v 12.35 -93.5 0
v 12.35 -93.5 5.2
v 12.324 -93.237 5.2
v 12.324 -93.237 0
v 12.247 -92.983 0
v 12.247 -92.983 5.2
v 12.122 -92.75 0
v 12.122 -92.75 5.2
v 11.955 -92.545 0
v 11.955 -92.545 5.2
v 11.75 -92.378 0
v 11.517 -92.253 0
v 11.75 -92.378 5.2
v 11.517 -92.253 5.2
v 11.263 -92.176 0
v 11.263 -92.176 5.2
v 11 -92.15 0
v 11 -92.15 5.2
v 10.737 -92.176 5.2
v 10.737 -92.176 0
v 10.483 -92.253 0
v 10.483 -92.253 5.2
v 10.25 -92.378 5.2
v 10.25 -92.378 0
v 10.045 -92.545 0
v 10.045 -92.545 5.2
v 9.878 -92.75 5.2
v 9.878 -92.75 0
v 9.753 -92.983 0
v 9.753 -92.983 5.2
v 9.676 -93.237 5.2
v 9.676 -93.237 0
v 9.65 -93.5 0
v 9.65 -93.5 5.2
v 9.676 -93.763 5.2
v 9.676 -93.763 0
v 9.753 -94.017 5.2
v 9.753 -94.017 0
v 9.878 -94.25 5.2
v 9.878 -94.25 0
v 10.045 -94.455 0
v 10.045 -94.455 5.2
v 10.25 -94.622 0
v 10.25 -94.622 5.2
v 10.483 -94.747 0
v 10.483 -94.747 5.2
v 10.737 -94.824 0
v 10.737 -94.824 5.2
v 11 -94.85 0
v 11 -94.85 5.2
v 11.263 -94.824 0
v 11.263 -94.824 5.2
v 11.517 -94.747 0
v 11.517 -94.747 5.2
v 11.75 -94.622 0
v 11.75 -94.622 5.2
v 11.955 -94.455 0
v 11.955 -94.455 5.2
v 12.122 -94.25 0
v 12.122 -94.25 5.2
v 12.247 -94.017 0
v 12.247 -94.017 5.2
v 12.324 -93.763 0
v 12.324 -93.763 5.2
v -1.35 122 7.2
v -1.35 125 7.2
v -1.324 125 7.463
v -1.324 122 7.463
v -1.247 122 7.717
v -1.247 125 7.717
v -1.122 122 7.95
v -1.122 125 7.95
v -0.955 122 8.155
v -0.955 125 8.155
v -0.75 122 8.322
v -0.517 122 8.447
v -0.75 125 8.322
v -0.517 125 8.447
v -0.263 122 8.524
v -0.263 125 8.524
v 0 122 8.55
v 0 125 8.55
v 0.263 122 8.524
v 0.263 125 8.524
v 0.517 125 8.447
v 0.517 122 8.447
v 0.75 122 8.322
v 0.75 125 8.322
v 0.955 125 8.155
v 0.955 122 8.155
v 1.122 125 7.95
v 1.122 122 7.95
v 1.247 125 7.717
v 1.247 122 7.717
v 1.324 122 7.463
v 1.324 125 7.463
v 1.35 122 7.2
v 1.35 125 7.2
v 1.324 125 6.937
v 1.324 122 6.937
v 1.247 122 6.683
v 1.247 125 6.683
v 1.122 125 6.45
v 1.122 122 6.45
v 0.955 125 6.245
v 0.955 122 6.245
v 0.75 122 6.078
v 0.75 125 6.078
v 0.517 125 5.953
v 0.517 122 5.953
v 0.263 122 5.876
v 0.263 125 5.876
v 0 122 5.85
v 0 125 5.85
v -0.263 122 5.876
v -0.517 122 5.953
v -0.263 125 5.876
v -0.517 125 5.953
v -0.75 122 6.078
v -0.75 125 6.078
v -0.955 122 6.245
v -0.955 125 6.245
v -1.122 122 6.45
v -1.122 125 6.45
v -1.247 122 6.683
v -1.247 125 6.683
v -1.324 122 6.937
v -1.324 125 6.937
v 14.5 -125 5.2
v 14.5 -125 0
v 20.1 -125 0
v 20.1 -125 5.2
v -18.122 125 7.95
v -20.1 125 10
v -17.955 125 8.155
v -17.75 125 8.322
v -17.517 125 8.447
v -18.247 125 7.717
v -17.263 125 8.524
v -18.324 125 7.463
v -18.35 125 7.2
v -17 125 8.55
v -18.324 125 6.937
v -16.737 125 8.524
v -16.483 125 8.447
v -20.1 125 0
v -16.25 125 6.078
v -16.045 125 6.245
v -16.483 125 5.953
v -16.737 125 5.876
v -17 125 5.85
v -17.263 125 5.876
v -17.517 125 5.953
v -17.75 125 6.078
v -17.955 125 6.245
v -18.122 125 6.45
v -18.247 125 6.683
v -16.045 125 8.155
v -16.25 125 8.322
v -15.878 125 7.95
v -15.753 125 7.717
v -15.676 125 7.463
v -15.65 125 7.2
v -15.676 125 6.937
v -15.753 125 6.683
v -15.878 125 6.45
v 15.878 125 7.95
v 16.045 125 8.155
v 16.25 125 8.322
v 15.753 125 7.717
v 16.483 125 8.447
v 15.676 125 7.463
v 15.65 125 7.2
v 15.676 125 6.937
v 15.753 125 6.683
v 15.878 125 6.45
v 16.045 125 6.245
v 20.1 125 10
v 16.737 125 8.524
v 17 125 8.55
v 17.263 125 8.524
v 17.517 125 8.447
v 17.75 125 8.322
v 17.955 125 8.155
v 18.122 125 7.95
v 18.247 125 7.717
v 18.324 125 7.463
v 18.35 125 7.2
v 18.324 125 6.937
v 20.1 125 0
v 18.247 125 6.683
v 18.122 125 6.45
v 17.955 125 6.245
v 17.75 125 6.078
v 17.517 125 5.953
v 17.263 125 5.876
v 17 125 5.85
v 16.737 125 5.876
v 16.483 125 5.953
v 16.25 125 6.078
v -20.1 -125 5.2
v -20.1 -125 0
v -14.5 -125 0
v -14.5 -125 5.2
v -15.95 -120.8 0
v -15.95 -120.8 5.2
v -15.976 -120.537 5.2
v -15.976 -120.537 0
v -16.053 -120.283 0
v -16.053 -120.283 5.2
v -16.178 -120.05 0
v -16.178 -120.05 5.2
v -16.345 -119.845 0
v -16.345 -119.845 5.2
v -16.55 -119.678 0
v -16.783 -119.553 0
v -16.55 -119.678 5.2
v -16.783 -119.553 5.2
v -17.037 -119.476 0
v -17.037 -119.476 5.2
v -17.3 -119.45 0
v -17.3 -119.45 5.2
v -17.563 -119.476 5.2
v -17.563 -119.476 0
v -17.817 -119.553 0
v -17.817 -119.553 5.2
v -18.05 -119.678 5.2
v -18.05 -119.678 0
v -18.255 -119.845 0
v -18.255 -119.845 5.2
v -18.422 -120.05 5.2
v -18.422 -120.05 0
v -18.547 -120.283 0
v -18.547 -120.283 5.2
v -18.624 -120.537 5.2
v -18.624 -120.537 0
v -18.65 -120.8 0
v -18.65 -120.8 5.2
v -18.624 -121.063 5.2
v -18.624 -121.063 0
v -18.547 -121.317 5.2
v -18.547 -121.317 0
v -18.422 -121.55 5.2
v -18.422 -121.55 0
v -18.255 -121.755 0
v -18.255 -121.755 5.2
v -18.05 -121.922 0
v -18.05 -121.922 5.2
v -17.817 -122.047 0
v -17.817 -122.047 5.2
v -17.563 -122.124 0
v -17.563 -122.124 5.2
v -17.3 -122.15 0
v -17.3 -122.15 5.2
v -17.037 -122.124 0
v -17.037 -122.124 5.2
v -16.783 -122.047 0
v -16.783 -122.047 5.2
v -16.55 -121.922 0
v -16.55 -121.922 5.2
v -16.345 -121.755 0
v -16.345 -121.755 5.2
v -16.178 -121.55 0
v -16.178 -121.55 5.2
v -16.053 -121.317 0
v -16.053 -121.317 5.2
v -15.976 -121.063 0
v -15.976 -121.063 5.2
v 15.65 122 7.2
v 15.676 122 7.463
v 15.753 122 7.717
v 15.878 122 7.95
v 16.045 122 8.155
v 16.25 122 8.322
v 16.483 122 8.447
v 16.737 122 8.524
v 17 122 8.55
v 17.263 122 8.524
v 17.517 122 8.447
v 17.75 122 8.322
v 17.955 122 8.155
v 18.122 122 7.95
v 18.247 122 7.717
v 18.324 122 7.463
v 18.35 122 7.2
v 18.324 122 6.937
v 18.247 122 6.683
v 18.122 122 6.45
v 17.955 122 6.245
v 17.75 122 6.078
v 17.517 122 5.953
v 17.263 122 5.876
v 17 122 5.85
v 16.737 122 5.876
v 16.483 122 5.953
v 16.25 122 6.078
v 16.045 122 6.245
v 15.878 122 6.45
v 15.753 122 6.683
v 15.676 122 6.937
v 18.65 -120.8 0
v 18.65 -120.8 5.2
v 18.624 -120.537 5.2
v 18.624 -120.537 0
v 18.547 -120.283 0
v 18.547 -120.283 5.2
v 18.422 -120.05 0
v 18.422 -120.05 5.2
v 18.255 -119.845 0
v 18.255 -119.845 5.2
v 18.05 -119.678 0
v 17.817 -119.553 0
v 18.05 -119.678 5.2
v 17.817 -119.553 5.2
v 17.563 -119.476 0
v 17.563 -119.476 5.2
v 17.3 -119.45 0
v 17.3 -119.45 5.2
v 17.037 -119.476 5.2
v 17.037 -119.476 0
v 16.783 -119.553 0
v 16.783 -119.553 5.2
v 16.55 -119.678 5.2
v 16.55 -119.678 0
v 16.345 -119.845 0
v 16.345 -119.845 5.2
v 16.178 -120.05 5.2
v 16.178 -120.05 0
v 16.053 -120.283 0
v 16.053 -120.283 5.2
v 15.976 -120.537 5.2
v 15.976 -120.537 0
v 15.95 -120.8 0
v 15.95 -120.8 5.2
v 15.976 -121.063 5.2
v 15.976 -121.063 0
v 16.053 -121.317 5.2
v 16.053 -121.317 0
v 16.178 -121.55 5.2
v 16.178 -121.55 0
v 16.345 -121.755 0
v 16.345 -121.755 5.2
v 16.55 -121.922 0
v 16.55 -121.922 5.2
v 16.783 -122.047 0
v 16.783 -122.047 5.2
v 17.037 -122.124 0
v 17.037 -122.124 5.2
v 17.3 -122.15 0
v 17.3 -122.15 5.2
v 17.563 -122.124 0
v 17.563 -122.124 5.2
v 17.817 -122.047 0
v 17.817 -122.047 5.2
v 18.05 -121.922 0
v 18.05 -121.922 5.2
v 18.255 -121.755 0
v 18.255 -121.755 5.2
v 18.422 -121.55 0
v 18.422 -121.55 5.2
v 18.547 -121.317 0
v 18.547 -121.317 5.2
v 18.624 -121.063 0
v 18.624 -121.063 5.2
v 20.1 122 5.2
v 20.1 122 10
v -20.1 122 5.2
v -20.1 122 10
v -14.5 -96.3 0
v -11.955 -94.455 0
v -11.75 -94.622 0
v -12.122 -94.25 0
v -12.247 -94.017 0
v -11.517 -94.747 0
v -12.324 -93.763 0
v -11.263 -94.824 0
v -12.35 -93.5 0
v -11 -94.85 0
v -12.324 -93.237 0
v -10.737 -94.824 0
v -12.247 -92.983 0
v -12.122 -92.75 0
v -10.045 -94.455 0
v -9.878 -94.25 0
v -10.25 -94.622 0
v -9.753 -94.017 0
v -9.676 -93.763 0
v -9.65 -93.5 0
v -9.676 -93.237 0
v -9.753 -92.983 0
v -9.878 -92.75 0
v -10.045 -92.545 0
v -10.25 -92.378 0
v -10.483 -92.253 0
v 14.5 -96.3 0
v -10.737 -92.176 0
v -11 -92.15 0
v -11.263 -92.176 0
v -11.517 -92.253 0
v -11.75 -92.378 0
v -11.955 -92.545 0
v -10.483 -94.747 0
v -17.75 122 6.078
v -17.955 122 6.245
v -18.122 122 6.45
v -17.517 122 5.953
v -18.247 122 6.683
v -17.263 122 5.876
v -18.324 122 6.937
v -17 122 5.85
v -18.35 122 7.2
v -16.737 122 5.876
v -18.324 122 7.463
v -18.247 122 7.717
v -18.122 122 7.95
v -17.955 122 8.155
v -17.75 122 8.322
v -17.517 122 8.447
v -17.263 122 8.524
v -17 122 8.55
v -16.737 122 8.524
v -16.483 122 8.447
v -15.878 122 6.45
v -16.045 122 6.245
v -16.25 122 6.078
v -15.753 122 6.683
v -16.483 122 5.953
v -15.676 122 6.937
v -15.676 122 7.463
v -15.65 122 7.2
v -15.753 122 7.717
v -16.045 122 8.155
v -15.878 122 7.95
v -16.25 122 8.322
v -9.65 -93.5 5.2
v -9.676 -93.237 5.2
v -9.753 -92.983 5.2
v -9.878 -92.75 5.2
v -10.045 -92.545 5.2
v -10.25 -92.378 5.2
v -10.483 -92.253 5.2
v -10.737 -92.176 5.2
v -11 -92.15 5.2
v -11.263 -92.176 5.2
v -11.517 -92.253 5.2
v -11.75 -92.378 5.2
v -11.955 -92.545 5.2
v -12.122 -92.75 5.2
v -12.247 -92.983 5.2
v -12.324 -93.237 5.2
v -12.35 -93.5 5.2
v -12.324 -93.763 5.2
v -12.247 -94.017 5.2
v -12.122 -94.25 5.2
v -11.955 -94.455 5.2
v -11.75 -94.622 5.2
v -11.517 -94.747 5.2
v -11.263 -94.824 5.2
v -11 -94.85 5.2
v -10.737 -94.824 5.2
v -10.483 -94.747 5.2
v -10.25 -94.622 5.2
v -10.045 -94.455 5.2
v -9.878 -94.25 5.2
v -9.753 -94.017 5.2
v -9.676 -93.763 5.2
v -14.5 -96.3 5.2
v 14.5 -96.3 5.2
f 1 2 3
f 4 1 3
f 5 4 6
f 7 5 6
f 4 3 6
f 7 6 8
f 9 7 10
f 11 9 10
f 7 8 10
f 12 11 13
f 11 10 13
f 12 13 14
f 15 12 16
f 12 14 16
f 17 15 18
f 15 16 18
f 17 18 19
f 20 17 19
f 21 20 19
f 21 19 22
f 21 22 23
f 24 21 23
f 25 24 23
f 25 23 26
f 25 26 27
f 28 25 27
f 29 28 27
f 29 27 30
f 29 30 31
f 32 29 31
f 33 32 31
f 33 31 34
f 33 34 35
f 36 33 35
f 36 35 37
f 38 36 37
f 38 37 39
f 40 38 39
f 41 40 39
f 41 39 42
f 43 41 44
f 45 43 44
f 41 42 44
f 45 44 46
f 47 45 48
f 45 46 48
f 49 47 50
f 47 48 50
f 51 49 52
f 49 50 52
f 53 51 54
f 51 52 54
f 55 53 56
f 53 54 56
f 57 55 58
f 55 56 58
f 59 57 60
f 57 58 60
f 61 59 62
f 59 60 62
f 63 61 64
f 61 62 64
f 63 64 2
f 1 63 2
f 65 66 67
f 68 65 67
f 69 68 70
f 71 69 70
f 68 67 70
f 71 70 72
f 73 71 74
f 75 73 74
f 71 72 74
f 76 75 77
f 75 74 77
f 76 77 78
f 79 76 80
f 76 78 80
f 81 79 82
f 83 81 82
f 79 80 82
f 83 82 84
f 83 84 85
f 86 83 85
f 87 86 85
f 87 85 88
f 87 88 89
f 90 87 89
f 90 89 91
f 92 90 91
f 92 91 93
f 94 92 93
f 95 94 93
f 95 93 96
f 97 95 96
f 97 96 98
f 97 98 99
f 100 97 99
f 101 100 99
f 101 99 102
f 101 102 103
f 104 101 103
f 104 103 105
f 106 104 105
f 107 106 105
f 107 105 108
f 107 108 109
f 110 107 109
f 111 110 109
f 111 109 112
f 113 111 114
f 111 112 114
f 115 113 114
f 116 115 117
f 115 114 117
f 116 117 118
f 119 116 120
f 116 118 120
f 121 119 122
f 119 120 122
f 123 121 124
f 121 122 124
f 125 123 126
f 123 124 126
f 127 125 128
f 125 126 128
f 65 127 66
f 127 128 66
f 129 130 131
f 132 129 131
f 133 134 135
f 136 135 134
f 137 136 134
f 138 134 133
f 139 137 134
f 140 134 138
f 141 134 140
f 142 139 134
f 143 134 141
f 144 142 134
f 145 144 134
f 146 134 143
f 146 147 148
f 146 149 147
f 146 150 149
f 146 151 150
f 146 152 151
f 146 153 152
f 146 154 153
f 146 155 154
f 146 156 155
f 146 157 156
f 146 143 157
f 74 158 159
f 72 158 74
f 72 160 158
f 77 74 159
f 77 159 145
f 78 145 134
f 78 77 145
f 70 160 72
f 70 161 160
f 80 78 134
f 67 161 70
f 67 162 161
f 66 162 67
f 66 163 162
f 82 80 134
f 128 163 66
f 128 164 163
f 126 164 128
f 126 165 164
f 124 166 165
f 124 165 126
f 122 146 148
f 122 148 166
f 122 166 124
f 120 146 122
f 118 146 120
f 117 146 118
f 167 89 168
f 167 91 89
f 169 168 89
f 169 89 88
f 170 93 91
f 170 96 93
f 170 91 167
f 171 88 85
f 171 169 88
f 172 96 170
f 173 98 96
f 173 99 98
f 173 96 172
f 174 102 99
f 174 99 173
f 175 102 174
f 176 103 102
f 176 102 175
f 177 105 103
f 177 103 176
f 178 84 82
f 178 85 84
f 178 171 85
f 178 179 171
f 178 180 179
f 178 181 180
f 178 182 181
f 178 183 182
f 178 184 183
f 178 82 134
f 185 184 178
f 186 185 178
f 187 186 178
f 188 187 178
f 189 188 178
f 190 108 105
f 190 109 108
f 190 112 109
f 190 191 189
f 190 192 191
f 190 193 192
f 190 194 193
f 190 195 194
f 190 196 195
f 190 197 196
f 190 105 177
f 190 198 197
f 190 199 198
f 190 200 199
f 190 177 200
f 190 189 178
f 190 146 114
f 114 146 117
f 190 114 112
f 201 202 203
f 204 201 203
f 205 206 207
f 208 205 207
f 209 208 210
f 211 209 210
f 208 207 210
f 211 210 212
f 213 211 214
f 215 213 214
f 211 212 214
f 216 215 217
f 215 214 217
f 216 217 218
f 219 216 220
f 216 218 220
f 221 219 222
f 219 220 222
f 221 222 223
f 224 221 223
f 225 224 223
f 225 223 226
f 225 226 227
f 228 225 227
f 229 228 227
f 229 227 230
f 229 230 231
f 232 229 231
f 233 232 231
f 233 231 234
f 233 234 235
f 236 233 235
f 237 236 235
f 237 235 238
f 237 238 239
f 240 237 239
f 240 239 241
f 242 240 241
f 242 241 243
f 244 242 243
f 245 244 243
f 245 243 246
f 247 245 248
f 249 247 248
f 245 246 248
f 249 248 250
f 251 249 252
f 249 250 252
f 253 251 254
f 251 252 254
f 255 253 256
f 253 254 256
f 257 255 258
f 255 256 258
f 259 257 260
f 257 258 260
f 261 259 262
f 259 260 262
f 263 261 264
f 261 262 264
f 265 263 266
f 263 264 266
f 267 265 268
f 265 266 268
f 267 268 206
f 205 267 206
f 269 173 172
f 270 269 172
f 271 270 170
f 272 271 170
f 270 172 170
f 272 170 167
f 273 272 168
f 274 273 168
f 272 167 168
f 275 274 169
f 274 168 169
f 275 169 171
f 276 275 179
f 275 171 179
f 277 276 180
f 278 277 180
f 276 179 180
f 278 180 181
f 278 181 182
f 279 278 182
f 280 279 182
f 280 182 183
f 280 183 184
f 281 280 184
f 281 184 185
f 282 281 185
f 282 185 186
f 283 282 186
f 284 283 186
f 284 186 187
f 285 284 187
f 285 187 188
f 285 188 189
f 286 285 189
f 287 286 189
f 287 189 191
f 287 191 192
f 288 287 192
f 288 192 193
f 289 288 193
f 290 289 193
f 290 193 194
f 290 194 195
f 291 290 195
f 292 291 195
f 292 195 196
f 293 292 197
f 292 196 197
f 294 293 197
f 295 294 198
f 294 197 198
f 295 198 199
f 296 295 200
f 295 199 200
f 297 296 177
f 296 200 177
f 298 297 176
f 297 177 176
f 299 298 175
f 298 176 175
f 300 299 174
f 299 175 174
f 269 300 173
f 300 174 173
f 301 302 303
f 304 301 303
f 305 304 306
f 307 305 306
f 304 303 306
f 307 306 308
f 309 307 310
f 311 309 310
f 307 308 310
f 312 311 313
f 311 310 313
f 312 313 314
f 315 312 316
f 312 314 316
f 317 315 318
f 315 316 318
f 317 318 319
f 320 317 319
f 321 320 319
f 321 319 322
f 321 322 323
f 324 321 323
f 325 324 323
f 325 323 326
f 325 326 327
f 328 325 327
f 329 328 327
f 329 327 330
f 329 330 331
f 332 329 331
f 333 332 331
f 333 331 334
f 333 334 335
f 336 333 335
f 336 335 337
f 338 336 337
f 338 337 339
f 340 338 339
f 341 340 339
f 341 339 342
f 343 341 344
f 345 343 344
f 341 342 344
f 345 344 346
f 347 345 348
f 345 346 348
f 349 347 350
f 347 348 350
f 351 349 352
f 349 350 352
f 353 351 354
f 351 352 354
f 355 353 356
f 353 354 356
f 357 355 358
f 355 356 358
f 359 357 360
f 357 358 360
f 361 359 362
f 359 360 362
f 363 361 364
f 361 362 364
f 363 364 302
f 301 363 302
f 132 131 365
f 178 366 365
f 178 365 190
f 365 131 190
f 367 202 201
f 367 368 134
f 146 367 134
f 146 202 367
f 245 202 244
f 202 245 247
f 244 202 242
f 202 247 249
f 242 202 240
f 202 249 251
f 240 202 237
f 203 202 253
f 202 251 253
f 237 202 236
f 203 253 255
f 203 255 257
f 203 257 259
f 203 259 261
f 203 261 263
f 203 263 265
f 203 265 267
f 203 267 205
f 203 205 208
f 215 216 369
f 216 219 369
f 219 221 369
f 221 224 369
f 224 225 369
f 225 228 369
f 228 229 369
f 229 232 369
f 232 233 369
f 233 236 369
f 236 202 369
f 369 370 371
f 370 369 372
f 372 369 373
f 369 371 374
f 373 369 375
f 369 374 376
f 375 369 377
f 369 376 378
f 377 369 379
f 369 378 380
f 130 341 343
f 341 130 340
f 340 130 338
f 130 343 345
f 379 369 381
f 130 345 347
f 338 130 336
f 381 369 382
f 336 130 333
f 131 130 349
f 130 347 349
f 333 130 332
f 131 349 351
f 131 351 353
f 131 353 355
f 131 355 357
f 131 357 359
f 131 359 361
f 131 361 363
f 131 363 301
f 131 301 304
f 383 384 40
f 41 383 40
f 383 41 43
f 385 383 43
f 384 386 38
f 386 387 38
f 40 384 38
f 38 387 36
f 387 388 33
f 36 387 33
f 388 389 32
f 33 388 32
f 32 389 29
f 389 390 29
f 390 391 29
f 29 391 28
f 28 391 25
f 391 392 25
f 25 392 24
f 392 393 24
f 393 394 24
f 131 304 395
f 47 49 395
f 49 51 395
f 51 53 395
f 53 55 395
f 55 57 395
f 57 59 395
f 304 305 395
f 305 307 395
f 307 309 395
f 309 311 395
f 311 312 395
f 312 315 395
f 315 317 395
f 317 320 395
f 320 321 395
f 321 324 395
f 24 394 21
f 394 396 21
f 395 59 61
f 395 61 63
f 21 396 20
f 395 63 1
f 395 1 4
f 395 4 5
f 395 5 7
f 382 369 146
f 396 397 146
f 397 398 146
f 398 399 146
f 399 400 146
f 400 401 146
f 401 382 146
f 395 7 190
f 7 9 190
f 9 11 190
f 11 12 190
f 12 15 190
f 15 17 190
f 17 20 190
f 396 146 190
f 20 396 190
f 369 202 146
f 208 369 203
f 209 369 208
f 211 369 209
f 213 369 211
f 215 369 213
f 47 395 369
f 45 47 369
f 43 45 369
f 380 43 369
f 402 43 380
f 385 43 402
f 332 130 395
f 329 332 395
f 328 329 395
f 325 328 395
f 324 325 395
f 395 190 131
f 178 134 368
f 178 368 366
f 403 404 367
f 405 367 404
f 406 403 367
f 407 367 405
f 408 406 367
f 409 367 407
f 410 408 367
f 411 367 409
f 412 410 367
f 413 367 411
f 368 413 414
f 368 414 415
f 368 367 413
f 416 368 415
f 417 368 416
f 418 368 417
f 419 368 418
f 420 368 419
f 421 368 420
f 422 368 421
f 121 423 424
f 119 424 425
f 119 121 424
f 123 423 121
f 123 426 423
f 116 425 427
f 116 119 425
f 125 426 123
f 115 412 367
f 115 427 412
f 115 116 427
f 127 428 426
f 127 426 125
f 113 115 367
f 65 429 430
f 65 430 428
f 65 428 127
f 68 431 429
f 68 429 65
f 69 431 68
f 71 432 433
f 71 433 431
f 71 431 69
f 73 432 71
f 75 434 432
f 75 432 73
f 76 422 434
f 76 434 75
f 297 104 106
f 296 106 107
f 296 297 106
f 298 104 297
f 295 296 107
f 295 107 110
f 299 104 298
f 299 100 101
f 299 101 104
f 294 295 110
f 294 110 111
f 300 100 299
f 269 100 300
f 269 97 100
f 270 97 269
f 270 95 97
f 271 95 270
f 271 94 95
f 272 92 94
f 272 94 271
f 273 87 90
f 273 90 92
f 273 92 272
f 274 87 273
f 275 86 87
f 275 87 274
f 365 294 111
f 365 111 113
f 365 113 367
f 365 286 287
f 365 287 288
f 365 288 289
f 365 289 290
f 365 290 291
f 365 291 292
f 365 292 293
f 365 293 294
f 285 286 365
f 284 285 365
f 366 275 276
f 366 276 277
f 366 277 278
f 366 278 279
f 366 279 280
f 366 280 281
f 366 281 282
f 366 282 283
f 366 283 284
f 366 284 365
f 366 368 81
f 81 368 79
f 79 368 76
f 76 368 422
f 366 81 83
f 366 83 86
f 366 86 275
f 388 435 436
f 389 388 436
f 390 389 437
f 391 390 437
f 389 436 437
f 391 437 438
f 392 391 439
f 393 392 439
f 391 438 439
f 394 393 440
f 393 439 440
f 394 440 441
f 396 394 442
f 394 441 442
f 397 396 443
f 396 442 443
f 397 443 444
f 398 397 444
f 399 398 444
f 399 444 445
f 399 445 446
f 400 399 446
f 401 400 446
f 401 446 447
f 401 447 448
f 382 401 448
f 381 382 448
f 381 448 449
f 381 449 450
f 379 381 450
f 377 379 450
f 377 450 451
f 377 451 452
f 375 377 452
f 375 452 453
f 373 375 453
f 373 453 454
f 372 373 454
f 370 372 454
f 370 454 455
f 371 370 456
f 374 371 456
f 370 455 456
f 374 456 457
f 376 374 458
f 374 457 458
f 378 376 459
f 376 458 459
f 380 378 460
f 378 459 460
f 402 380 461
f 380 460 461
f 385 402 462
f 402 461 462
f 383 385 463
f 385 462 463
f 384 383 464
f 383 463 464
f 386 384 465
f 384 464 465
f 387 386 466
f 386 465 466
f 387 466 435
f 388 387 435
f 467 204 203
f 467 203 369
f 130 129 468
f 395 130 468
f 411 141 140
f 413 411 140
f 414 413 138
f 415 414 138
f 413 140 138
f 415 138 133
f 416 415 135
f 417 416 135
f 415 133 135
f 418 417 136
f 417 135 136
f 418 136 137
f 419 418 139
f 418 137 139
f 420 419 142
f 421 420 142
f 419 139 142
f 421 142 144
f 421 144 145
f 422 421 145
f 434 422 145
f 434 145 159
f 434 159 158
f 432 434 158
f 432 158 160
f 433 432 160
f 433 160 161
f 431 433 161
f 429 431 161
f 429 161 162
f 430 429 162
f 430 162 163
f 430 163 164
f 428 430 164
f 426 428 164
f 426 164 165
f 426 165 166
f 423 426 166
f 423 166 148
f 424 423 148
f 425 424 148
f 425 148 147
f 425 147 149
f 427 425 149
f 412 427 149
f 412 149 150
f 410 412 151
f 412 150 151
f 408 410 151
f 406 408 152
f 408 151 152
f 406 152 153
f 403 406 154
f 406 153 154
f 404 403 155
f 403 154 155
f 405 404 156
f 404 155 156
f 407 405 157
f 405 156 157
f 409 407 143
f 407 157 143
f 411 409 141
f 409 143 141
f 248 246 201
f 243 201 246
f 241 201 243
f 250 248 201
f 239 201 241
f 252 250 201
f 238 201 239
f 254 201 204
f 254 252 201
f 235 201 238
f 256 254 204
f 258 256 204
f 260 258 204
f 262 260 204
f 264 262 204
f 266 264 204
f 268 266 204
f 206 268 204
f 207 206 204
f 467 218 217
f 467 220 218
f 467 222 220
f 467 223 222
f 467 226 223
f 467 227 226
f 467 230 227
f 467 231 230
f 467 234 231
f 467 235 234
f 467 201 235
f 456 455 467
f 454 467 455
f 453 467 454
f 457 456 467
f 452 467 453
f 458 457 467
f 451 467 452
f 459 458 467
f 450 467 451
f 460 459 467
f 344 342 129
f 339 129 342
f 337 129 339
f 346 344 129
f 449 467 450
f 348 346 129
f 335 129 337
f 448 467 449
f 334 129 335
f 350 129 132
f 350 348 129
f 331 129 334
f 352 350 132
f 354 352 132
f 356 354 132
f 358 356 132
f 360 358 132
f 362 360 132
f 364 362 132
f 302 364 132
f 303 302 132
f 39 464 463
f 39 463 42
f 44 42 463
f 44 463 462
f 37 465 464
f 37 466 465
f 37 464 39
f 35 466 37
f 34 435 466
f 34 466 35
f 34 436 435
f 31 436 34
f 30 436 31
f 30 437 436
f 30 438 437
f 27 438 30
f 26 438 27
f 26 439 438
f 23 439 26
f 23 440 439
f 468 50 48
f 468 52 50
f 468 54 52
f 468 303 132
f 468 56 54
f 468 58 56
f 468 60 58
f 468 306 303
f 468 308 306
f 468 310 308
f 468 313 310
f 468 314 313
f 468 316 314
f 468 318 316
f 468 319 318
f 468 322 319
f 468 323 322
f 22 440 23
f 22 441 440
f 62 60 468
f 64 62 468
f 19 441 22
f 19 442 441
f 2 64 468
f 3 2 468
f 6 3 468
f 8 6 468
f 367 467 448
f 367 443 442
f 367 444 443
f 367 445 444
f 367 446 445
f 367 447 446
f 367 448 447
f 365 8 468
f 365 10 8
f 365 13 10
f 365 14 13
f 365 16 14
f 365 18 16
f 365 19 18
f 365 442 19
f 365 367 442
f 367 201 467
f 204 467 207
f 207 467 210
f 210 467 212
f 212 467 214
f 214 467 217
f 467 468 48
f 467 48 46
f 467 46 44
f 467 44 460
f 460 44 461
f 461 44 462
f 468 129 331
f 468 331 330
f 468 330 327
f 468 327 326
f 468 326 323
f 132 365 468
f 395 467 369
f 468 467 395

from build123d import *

# Parameters (mm, degrees)
SKETCH1_W           = 40.2
SKETCH1_H           = 250
BOSS_EXTRUDE1_DEPTH = 10
SKETCH4_W           = 40.2
SKETCH4_H           = 247
CUT_EXTRUDE1_DEPTH  = 4.8
SKETCH3_W           = 29
SKETCH3_H           = 28.7
CUT_EXTRUDE2_DEPTH  = 11
SKETCH2_R           = 1.35
CUT_EXTRUDE3_DEPTH  = 11
SKETCH6_R           = 1.35
CUT_EXTRUDE4_DEPTH  = 251


with BuildPart() as part:
    # Sketch1 → Boss-Extrude1 (new body)
    with BuildSketch(Plane.XY):
        Rectangle(SKETCH1_W, SKETCH1_H)
    extrude(amount=BOSS_EXTRUDE1_DEPTH)

    # Sketch4 → Cut-Extrude1 (cut)
    with BuildSketch(Plane.XY.offset(10)):
        with Locations((0, -1.5)):
            Rectangle(SKETCH4_W, SKETCH4_H)
    extrude(amount=-CUT_EXTRUDE1_DEPTH, mode=Mode.SUBTRACT)

    # Sketch3 → Cut-Extrude2 (cut, through all)
    with BuildSketch(Plane.XY.offset(10)):
        with Locations((0, -110.65)):
            Rectangle(SKETCH3_W, SKETCH3_H)
    extrude(amount=-CUT_EXTRUDE2_DEPTH, mode=Mode.SUBTRACT)

    # Sketch2 → Cut-Extrude3 (cut, through all)
    with BuildSketch(Plane.XY.offset(10)):
        with Locations((17.3, -120.8)):
            Circle(SKETCH2_R)
        with Locations((11, -93.5)):
            Circle(SKETCH2_R)
        with Locations((-17.3, -120.8)):
            Circle(SKETCH2_R)
        with Locations((-11, -93.5)):
            Circle(SKETCH2_R)
    extrude(amount=-CUT_EXTRUDE3_DEPTH, mode=Mode.SUBTRACT)

    # Sketch6 → Cut-Extrude4 (cut, through all)
    with BuildSketch(Plane(origin=(0, 125, 0), x_dir=(-1, 0, 0), z_dir=(0, 1, 0))):
        with Locations((-17, 7.2)):
            Circle(SKETCH6_R)
        with Locations((17, 7.2)):
            Circle(SKETCH6_R)
        with Locations((0, 7.2)):
            Circle(SKETCH6_R)
    extrude(amount=-CUT_EXTRUDE4_DEPTH, mode=Mode.SUBTRACT)


solid = part.part
